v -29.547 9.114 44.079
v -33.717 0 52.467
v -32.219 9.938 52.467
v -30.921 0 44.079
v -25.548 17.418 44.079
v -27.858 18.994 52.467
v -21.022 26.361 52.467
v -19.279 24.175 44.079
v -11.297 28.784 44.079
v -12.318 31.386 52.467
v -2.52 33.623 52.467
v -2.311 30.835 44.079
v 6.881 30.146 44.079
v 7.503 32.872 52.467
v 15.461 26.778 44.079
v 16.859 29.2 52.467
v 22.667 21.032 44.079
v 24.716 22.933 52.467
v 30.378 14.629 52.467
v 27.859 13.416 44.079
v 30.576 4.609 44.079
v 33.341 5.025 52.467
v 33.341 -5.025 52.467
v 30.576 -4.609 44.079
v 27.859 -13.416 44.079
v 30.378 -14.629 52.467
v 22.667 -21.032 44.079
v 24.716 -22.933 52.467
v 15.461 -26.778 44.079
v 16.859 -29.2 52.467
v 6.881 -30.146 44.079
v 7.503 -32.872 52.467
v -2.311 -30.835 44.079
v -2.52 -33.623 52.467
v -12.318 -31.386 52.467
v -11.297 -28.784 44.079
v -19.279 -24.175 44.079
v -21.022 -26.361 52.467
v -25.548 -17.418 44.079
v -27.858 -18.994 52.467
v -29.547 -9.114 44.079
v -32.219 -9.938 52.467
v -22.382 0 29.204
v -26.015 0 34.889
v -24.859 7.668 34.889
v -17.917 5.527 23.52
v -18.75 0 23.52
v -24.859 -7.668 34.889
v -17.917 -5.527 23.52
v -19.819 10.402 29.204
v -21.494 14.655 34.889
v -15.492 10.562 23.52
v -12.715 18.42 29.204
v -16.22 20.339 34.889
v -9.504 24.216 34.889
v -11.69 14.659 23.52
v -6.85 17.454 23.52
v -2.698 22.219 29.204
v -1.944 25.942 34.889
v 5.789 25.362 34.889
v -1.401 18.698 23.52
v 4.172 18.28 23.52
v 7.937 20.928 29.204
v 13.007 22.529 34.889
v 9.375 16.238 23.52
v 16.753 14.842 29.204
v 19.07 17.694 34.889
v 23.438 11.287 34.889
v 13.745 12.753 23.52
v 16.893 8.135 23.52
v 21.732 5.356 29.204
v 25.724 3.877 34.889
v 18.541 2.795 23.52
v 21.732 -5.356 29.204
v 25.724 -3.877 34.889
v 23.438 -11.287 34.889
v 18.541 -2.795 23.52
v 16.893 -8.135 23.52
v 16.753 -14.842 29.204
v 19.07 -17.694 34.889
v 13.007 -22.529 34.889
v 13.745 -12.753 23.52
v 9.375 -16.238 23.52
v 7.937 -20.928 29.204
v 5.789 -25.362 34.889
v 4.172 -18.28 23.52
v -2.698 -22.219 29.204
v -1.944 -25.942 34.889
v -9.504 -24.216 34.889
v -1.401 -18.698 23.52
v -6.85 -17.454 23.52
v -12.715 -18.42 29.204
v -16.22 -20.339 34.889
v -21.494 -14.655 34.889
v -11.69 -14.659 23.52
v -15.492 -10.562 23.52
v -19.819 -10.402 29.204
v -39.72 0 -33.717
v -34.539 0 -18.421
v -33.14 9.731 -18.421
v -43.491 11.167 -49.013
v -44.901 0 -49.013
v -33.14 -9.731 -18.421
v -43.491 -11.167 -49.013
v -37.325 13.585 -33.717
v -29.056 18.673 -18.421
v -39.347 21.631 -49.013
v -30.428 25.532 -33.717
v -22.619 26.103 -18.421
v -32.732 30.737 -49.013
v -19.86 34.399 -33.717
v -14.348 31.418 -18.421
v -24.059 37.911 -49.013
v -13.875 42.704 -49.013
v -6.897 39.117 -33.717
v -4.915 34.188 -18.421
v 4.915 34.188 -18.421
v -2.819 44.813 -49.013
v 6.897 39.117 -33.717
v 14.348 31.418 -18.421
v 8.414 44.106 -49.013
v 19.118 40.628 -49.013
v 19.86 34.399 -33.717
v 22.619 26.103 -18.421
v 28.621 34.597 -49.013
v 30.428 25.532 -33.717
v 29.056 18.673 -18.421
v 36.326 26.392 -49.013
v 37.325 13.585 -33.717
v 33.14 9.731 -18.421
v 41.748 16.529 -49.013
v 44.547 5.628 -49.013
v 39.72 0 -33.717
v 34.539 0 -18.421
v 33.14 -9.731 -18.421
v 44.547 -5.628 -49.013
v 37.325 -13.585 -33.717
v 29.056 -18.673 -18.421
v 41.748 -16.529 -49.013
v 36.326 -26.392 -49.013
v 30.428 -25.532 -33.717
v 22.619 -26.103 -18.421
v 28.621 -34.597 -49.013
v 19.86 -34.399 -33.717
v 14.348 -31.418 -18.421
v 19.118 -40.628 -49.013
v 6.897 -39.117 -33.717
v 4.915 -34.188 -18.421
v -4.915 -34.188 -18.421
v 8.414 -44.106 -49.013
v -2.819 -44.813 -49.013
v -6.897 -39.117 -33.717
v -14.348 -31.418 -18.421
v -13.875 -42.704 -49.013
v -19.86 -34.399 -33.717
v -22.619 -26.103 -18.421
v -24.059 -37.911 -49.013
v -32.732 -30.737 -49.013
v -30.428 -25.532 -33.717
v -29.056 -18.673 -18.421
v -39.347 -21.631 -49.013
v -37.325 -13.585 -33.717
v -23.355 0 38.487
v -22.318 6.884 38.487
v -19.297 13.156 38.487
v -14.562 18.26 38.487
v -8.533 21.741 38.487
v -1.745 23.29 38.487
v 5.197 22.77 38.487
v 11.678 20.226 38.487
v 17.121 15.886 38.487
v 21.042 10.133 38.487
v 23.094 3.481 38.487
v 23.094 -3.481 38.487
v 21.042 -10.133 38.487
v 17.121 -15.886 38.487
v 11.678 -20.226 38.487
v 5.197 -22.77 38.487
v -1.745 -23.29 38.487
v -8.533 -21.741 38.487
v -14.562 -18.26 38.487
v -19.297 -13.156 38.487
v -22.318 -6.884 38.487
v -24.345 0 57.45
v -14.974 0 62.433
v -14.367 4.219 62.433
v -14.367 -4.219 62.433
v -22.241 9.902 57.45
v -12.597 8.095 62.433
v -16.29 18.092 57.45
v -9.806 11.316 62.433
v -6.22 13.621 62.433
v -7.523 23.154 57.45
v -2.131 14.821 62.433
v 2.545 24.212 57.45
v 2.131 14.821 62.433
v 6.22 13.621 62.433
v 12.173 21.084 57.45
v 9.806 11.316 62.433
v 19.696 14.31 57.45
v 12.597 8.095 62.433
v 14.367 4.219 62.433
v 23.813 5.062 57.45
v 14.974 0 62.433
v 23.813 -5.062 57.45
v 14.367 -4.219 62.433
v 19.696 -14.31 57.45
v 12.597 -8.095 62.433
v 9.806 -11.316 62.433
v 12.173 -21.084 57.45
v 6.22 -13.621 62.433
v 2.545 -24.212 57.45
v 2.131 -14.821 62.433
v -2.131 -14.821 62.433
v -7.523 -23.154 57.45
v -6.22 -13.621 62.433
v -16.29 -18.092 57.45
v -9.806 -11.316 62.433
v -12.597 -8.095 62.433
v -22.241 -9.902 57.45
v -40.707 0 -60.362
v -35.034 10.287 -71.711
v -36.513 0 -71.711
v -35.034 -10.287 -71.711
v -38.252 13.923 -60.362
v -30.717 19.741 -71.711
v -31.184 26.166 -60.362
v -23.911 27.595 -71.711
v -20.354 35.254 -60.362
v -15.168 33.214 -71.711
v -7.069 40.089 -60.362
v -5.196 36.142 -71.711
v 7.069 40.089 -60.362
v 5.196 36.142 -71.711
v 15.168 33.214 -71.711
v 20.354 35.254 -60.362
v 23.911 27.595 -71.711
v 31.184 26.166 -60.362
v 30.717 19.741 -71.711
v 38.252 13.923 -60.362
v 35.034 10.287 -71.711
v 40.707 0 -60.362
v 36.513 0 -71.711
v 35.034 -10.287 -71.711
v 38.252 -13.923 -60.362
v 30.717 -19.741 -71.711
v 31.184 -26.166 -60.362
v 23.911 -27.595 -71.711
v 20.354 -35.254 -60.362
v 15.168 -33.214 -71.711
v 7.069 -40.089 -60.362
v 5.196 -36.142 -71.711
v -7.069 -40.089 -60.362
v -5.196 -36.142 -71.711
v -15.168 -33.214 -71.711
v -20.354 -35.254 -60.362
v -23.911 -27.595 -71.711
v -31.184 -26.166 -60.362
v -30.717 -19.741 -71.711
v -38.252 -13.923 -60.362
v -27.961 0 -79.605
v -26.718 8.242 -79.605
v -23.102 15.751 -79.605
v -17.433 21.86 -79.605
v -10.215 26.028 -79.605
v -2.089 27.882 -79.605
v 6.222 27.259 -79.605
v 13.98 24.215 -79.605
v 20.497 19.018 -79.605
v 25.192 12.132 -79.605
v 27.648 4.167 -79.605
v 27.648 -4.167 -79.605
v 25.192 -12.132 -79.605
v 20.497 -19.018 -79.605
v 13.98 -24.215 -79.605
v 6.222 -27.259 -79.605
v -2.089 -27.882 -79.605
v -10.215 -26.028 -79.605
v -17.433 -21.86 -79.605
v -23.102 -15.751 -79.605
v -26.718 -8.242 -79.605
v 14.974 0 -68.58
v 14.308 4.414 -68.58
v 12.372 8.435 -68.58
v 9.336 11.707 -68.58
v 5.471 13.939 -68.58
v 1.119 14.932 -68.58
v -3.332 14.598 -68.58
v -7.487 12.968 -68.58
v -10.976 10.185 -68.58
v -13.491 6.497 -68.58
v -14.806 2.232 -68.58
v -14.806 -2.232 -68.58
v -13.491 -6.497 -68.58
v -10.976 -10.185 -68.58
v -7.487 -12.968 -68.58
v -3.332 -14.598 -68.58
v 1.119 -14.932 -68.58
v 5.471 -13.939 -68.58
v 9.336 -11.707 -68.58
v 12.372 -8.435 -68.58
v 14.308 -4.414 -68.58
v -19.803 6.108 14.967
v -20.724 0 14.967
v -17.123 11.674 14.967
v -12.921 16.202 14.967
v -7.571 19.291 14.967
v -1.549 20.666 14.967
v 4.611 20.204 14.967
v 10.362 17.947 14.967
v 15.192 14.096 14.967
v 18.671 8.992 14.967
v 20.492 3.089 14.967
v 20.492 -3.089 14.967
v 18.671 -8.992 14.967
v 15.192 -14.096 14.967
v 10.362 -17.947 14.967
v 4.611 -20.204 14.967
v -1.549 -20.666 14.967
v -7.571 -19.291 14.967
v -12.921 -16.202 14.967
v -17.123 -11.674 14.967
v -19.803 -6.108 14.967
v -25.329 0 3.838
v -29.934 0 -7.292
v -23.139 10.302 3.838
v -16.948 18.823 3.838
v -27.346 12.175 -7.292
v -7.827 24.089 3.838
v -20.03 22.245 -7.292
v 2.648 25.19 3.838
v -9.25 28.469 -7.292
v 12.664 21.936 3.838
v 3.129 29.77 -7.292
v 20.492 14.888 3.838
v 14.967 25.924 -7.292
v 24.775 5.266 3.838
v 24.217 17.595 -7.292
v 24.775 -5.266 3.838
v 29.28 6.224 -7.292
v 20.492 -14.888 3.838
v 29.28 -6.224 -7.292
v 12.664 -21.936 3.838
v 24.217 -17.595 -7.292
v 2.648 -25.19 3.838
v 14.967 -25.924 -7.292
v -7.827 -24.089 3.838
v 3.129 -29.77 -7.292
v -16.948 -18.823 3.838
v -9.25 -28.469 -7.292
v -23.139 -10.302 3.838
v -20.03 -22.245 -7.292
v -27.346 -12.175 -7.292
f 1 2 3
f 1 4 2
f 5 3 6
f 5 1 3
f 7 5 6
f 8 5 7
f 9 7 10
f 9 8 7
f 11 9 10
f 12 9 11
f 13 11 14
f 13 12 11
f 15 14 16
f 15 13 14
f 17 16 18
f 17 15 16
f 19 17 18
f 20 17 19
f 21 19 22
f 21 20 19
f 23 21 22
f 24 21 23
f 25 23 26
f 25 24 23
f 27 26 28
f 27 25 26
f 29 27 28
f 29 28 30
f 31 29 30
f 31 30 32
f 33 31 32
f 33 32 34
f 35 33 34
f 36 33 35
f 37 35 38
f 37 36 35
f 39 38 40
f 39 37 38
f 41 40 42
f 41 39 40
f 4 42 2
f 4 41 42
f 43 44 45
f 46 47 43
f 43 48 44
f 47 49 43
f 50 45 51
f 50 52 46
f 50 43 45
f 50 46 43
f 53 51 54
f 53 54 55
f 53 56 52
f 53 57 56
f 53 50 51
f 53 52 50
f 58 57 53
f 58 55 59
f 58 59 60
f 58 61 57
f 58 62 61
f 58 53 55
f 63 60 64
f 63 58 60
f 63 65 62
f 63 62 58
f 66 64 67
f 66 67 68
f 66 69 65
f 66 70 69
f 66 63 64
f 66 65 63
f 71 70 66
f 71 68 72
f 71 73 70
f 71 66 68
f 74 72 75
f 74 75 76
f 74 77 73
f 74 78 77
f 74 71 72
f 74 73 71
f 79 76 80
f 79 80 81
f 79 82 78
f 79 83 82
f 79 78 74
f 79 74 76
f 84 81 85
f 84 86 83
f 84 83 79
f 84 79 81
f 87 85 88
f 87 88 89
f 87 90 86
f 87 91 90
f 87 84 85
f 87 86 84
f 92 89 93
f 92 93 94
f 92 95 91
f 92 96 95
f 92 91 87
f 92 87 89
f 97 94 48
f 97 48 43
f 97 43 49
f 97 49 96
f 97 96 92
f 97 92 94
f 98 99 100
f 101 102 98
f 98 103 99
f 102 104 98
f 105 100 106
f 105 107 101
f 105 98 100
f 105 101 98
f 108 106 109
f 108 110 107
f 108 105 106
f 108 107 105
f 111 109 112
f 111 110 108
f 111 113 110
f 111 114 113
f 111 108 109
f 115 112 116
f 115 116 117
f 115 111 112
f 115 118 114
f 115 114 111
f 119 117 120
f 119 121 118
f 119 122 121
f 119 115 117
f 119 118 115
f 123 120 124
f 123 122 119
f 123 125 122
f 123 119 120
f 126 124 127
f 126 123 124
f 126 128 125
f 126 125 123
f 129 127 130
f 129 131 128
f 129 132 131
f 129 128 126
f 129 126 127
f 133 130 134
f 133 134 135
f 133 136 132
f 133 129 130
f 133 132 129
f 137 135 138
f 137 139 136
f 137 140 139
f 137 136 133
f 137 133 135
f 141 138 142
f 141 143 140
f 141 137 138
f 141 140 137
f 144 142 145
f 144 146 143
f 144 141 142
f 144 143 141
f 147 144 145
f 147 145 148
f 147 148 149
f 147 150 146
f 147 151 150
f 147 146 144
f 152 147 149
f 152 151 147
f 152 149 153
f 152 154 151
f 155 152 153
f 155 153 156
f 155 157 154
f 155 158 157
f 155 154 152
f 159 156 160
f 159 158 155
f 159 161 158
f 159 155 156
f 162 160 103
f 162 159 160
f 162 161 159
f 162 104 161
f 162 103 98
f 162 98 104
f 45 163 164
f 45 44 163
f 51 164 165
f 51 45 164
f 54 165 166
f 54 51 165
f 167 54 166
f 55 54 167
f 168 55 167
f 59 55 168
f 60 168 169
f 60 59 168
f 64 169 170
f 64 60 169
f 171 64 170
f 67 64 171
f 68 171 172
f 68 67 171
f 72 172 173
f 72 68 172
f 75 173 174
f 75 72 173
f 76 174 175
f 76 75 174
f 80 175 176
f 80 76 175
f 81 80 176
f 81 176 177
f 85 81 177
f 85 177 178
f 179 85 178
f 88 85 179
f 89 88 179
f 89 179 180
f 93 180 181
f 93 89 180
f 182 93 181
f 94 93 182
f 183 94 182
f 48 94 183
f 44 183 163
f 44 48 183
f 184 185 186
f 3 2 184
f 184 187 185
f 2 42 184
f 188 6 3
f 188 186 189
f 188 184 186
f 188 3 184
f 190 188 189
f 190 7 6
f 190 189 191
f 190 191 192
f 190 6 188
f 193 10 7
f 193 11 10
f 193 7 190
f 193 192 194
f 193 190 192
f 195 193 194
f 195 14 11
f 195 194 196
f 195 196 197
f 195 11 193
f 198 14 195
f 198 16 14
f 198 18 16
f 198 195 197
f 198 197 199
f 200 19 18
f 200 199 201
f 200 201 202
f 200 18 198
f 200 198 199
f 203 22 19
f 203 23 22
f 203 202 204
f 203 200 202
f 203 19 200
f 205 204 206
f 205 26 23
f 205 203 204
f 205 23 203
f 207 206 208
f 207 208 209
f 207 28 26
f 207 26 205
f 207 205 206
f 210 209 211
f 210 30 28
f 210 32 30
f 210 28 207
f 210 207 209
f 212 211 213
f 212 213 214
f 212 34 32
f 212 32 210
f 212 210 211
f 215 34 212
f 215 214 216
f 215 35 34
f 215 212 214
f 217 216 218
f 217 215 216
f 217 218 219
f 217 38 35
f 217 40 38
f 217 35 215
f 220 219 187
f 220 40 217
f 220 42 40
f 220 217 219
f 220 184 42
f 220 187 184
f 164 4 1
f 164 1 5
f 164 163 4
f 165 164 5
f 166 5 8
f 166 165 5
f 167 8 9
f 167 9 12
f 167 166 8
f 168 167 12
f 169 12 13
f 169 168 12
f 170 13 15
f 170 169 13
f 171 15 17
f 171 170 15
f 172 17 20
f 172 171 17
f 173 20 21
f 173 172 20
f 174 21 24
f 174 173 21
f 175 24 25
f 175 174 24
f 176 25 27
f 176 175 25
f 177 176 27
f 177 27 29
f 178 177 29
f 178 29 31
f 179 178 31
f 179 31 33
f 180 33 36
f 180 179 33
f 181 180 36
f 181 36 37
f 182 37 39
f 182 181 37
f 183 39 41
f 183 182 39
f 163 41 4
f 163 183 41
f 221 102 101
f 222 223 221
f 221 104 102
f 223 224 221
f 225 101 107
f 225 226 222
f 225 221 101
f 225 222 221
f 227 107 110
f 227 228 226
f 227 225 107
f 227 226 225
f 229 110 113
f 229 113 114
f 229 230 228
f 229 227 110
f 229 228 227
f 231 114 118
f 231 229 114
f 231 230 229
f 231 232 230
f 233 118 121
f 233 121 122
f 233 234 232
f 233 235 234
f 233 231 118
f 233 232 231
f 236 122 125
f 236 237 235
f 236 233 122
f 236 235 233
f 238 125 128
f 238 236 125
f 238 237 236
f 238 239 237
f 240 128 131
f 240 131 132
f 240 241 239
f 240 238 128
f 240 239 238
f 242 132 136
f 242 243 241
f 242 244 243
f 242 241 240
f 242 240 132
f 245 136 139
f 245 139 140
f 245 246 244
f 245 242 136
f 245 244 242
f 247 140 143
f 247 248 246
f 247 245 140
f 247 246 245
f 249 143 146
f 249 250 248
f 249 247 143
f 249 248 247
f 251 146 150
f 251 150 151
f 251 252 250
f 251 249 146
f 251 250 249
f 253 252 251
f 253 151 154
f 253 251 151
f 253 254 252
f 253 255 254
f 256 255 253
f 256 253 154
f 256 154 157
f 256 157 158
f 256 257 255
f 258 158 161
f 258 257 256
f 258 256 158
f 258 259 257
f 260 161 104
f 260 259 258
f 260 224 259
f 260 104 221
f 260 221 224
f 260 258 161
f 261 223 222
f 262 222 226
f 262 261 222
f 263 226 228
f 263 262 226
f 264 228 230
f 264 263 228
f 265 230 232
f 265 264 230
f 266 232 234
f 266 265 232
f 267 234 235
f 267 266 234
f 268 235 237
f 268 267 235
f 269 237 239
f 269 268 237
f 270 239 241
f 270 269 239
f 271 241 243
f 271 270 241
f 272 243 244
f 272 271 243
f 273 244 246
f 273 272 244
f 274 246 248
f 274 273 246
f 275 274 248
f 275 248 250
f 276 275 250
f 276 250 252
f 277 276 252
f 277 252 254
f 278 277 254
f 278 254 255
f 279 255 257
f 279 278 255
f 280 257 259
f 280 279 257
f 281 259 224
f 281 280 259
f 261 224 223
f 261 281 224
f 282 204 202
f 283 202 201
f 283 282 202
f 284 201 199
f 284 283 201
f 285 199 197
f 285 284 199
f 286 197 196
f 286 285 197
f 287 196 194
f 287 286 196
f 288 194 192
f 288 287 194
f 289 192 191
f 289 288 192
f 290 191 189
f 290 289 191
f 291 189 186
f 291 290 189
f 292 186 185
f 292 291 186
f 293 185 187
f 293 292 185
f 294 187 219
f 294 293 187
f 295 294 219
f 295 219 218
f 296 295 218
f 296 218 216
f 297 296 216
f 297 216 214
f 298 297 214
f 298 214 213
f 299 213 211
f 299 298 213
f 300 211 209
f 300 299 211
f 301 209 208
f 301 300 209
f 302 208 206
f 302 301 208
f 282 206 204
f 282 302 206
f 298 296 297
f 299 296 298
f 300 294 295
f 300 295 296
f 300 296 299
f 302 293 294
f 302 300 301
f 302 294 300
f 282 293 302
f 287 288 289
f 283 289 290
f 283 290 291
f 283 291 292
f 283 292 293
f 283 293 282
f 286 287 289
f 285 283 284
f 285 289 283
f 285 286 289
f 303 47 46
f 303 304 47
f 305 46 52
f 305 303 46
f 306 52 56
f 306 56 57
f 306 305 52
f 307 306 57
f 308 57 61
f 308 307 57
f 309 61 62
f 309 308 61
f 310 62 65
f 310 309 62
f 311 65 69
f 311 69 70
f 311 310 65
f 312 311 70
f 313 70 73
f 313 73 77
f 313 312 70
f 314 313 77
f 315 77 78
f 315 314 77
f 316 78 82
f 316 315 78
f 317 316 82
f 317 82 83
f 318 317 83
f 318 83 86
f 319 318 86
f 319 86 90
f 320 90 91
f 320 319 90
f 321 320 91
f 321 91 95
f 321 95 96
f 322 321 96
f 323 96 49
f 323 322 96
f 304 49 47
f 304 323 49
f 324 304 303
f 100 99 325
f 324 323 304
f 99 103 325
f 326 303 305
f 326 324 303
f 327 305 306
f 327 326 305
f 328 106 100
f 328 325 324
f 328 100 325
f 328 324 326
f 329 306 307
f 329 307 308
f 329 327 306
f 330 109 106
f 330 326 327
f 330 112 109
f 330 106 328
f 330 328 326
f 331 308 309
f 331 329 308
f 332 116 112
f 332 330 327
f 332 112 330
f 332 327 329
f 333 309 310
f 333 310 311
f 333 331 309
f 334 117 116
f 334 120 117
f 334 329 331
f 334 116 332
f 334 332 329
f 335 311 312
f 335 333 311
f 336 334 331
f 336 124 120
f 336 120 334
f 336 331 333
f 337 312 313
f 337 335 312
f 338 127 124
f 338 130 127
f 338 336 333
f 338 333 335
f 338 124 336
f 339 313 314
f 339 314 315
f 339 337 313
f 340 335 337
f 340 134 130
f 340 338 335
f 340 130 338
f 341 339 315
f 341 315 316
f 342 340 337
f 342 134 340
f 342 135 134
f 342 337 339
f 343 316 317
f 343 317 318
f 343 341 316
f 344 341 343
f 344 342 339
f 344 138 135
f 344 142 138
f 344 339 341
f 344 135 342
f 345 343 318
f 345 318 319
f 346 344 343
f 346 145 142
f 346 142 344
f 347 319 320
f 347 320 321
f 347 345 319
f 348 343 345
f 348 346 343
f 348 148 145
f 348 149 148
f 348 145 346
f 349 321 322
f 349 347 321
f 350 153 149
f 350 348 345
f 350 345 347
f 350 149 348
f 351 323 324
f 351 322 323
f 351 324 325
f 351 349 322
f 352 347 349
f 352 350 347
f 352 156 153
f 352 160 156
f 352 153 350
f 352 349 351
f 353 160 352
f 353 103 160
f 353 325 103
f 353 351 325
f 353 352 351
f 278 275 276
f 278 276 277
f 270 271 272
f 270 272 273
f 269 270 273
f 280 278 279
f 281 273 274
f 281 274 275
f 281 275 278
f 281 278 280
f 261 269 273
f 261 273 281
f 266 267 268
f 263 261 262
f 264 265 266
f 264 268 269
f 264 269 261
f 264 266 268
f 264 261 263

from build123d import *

# Parameters (mm, degrees)
F2_R     = 14.973683
F3_DEPTH = 88.392
F4_DEPTH = 68.58


with BuildPart() as f1:
    # F0 (on Front) → F1 (revolve)
    with BuildSketch(Plane.XZ):
        Polygon((0, -79.605266), (0, 70.394734), (-33.717105, 52.467106), (-30.921052, 44.078944), (-23.355263, 38.486842), (-26.014588, 34.888929), (-18.749999, 23.519738), (-20.723683, 14.967105), (-34.539474, -18.421052), (-44.901316, -49.01316), (-36.513158, -71.710529), (-27.960526, -79.605266), align=None)
    revolve(axis=Axis((0, 0, -4.605266), (0, 0, -1)))

    # F2 (on Top) → F3 (cut)
    with BuildSketch(Plane.XY):
        Circle(F2_R)
    extrude(amount=F3_DEPTH, mode=Mode.SUBTRACT)

    # F2 (on Top) → F4 (cut)
    with BuildSketch(Plane.XY):
        Circle(F2_R)
    extrude(amount=-F4_DEPTH, mode=Mode.SUBTRACT)


solid = f1.part
